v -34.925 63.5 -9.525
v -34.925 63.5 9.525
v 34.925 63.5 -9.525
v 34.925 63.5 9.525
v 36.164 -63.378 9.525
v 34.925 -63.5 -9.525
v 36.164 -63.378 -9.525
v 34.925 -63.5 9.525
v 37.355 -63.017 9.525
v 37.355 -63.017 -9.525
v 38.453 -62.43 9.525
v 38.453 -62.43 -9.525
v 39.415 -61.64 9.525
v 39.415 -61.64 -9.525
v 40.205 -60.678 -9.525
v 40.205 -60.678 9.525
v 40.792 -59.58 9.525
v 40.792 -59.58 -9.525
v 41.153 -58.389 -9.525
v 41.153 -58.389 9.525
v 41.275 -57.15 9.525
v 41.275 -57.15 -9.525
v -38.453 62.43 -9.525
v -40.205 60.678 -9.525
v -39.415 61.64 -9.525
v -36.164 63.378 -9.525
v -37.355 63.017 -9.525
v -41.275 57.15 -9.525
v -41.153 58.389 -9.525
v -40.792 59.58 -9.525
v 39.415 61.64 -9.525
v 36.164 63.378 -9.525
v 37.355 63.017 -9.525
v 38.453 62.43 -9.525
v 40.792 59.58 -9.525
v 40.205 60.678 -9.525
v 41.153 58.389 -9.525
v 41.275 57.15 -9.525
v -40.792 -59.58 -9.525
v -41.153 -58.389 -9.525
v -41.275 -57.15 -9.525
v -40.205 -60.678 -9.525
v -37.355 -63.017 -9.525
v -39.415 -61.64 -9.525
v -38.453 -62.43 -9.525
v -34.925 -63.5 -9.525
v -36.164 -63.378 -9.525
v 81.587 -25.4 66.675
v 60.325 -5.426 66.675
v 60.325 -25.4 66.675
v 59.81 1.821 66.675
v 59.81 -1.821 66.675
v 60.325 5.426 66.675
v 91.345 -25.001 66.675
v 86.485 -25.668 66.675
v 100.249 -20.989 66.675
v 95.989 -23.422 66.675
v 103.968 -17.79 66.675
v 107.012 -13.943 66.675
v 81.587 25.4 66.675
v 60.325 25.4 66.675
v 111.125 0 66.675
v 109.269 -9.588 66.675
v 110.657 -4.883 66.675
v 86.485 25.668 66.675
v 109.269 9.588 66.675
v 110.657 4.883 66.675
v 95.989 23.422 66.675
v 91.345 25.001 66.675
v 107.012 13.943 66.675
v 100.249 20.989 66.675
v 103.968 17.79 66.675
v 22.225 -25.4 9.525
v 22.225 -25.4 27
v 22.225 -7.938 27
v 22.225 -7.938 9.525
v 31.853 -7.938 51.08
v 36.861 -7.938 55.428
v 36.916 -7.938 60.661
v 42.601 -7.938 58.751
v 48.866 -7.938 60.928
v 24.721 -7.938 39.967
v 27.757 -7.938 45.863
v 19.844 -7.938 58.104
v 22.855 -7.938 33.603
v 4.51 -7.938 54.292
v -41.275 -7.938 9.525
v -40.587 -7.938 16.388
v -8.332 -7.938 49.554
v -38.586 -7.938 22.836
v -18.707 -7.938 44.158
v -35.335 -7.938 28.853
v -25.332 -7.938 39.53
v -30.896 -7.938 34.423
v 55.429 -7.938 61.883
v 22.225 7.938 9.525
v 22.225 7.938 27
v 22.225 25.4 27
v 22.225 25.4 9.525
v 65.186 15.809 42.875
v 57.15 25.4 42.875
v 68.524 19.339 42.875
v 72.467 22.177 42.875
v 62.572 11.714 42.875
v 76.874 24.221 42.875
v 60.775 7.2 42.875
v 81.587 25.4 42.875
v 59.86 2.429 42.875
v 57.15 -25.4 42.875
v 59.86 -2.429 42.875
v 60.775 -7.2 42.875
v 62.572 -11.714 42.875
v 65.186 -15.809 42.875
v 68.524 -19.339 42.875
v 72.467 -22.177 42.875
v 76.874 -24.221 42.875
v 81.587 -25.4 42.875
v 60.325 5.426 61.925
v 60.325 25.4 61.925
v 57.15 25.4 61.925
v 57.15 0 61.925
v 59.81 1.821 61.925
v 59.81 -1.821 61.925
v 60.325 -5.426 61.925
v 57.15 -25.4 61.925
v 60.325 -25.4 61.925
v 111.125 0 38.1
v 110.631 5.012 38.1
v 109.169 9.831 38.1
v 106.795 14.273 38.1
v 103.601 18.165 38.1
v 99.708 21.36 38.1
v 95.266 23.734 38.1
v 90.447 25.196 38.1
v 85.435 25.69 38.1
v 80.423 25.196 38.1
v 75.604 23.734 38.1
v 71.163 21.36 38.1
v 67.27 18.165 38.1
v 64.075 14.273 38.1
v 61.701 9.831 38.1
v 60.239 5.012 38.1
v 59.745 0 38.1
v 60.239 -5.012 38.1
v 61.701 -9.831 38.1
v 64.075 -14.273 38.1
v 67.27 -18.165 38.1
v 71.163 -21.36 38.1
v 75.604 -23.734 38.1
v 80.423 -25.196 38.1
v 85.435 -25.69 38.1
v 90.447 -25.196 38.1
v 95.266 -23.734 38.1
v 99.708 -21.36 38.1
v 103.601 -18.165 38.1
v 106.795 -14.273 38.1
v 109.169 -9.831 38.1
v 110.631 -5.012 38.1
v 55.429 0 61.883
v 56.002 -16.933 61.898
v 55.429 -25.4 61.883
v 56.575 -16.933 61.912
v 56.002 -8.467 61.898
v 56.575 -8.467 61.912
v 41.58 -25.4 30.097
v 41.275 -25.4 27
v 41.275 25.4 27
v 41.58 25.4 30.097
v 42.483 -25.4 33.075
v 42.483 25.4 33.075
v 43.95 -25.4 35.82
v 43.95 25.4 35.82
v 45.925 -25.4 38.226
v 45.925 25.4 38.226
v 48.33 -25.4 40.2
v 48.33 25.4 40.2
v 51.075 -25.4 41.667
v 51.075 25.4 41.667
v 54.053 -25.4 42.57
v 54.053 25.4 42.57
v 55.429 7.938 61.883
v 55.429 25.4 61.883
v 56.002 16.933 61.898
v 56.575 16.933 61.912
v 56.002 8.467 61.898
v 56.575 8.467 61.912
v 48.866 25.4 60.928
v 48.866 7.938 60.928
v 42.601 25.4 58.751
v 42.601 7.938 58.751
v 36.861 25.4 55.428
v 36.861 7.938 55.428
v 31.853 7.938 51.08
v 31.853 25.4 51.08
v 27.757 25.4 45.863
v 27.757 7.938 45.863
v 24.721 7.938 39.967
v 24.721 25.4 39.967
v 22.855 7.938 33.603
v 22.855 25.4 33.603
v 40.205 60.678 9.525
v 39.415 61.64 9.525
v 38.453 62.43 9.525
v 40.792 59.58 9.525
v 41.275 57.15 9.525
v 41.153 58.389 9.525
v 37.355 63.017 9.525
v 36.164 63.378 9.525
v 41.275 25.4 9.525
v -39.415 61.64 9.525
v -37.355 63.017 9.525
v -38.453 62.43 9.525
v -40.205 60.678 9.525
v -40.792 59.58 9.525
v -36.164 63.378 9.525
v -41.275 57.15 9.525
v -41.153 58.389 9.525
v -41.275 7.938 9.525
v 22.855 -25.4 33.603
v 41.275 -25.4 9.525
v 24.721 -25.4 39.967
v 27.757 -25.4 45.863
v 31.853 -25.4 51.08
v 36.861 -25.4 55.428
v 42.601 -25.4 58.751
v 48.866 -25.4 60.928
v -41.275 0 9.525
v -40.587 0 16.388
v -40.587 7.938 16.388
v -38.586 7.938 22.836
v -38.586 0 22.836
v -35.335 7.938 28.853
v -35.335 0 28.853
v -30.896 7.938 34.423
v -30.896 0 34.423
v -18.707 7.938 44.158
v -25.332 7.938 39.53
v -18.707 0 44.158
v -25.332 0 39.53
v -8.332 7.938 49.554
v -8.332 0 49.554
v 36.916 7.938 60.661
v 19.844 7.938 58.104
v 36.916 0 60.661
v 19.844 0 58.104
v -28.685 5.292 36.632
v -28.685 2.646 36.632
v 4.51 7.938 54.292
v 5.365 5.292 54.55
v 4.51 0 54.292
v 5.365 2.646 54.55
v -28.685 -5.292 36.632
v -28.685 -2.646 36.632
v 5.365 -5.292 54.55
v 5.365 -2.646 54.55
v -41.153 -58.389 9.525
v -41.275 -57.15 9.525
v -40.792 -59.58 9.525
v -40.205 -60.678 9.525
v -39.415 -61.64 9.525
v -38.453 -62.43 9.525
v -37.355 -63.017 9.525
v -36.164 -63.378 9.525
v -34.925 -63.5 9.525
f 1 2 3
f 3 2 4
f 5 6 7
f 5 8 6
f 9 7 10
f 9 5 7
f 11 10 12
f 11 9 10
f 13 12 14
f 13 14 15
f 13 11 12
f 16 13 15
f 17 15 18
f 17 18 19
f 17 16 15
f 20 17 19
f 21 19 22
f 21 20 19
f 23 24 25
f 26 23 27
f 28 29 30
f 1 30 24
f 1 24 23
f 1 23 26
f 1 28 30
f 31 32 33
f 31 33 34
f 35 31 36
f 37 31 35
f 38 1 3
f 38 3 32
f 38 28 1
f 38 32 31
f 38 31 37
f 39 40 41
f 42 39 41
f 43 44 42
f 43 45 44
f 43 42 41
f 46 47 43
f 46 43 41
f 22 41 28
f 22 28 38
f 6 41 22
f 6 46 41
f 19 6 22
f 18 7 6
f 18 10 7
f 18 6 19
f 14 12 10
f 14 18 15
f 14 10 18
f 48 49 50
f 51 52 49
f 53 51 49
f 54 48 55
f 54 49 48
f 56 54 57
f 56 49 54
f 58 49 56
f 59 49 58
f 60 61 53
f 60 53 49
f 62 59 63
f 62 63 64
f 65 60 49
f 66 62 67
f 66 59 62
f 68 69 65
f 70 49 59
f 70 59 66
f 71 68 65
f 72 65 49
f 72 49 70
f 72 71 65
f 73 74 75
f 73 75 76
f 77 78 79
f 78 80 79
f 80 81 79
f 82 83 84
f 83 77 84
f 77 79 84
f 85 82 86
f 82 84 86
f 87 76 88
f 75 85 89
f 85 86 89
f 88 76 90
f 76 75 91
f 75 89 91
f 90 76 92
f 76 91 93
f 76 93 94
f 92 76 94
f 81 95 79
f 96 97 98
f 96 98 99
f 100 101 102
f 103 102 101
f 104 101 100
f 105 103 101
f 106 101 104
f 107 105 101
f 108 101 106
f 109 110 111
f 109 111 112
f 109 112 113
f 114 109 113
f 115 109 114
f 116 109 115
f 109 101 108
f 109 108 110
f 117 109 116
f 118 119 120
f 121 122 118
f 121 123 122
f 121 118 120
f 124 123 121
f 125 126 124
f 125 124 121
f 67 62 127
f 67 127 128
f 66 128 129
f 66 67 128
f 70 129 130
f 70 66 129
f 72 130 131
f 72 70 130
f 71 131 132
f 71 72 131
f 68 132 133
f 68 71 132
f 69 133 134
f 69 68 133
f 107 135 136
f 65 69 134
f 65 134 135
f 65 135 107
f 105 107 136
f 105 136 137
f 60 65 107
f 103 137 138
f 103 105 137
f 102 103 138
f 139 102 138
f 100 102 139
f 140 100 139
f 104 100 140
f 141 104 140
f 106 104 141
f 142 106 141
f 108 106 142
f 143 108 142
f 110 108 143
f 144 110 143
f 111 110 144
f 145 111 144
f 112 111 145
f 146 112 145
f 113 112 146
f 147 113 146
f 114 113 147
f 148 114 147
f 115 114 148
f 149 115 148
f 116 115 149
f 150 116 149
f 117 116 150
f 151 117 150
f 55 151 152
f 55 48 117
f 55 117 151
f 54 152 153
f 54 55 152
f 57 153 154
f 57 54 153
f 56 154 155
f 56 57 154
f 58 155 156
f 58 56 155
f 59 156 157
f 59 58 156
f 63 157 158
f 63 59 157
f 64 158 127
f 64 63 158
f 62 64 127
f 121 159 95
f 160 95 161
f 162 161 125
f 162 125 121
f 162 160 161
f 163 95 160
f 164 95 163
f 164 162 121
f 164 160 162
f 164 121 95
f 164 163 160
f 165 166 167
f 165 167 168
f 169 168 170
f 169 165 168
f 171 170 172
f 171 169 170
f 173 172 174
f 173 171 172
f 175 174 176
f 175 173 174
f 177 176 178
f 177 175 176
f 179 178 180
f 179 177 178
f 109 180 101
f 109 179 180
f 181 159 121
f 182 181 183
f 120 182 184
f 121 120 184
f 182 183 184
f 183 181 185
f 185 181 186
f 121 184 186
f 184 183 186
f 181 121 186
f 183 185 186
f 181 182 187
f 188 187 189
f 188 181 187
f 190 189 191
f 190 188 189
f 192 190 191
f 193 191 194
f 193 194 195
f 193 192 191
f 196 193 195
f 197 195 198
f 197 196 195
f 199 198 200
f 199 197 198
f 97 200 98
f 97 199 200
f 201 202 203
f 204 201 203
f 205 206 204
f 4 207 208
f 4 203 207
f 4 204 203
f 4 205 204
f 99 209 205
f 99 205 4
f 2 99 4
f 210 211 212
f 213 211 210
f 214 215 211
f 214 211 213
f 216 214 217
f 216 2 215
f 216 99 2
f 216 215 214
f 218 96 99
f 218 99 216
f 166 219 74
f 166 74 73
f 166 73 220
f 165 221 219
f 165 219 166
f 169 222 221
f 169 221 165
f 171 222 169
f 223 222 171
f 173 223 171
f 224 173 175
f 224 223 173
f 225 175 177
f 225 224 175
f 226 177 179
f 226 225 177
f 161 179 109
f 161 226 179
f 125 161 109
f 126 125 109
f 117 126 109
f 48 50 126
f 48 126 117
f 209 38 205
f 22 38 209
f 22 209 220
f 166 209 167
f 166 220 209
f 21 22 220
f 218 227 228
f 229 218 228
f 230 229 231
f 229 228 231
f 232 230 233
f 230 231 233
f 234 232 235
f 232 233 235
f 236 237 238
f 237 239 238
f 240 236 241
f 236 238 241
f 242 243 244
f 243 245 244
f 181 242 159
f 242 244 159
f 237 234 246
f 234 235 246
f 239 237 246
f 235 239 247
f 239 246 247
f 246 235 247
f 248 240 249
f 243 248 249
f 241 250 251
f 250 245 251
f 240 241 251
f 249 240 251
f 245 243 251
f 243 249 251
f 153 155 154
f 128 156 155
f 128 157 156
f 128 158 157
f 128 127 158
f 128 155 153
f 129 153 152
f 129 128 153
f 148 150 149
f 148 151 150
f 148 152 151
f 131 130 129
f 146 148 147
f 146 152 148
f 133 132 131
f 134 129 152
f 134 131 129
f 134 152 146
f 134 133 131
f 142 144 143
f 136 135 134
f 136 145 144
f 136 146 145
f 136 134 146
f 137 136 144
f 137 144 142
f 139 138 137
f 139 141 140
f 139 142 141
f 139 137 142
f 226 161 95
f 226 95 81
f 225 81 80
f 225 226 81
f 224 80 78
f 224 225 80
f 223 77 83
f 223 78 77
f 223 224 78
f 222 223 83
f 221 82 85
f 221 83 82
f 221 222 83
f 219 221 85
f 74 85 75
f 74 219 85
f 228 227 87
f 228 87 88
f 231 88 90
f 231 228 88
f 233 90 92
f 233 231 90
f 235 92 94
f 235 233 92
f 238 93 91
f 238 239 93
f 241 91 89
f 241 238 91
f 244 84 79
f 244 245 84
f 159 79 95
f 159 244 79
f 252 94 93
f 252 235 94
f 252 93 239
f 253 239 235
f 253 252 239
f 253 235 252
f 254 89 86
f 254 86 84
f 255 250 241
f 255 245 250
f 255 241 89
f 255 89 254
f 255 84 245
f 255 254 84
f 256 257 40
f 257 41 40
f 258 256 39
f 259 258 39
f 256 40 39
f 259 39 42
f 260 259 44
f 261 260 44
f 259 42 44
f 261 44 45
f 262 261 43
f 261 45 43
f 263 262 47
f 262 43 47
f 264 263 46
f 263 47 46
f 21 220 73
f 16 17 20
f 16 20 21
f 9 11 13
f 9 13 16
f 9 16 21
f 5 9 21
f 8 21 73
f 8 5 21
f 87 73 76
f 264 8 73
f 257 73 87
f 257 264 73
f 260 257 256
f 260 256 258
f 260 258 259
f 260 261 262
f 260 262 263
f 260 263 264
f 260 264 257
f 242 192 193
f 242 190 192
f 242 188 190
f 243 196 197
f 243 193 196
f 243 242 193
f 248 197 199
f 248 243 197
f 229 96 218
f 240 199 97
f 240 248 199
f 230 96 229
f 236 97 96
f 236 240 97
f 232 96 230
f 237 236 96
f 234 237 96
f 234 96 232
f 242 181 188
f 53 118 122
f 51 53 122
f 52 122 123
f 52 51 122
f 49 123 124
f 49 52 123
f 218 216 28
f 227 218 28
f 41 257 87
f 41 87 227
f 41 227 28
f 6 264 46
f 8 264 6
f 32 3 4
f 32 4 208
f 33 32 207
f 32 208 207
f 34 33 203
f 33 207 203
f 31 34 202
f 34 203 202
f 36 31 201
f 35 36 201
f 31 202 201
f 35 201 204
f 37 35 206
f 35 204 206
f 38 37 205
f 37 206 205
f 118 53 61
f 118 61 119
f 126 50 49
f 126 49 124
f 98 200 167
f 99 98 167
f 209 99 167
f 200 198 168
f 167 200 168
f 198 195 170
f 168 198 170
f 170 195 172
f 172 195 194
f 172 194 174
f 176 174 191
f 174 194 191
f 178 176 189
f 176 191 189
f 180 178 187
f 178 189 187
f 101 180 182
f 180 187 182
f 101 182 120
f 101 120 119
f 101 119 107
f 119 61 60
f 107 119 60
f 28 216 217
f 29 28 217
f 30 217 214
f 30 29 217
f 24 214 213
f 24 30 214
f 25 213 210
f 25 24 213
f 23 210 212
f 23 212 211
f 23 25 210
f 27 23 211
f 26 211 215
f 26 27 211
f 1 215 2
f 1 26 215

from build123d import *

# Parameters (mm, degrees)
F1_DEPTH = 63.5
F2_DEPTH = 7.9375
F3_R     = 6.35
F4_DEPTH = 25.4


with BuildPart() as f1:
    # F0 (on Front) → F1 (new body, symmetric)
    with BuildSketch(Plane.XZ):
        Polygon((22.225, 9.525), (-41.275, 9.525), (-41.275, -9.525), (41.275, -9.525), (41.275, 9.525), align=None)
    extrude(amount=F1_DEPTH, both=True)

    # F0 (on Front) → F2 (join, symmetric)
    with BuildSketch(Plane.XZ):
        with BuildLine():
            add(Edge.make_bspline(
                [(-41.275, 9.525), (-41.231316, 40.761163), (-0.825848, 60.309073), (55.42913, 61.882778)],
                knots=[0, 0, 0, 0, 110.382184, 110.382184, 110.382184, 110.382184], degree=3))
            Line((-41.275, 9.525), (22.225, 9.525))
            Line((22.225, 9.525), (22.225, 27.0002))
            ThreePointArc((22.225, 27.0002), (31.853192, 51.0798), (55.42913, 61.882778))
        make_face()
    extrude(amount=F2_DEPTH, both=True)

    # F3
    f3_edges = [f1.edges().sort_by_distance(p)[0] for p in [
        (41.275, -63.5, 0),
        (-41.275, -63.5, 0),
        (41.275, 63.5, 0),
        (-41.275, 63.5, 0),
    ]]
    fillet(f3_edges, radius=F3_R)

    # F0 (on Front) → F4 (join, symmetric)
    with BuildSketch(Plane.XZ):
        with BuildLine():
            Line((22.225, 27.0002), (22.225, 9.525))
            Line((22.225, 9.525), (41.275, 9.525))
            Line((41.275, 9.525), (41.275, 27.0002))
            ThreePointArc((41.275, 27.0002), (45.92468, 38.22552), (57.15, 42.8752))
            Line((57.15, 42.8752), (60.325, 42.8752))
            Line((60.325, 42.8752), (60.325, 61.9252))
            Line((60.325, 61.9252), (57.15, 61.9252))
            add(Edge.make_bspline(
                [(55.42913, 61.882778), (56.001123, 61.898779), (56.574755, 61.912922), (57.15, 61.9252)],
                knots=[110.382184, 110.382184, 110.382184, 110.382184, 111.504536, 111.504536, 111.504536, 111.504536], degree=3))
            ThreePointArc((55.42913, 61.882778), (31.853192, 51.0798), (22.225, 27.0002))
        make_face()
        Polygon((60.325, 66.675), (60.325, 61.9252), (60.325, 42.8752), (85.435174, 42.8752), (85.435174, 66.675), align=None)
    extrude(amount=F4_DEPTH, both=True)

    # F0 (on Front) → F5 (revolve)
    with BuildSketch(Plane.XZ):
        Polygon((85.435174, 66.675), (85.435174, 42.8752), (85.435174, 38.1), (111.125, 38.1), (111.125, 66.675), align=None)
    revolve(axis=Axis((85.435174, 0, 52.3875), (0, 0, 1)))


solid = f1.part
